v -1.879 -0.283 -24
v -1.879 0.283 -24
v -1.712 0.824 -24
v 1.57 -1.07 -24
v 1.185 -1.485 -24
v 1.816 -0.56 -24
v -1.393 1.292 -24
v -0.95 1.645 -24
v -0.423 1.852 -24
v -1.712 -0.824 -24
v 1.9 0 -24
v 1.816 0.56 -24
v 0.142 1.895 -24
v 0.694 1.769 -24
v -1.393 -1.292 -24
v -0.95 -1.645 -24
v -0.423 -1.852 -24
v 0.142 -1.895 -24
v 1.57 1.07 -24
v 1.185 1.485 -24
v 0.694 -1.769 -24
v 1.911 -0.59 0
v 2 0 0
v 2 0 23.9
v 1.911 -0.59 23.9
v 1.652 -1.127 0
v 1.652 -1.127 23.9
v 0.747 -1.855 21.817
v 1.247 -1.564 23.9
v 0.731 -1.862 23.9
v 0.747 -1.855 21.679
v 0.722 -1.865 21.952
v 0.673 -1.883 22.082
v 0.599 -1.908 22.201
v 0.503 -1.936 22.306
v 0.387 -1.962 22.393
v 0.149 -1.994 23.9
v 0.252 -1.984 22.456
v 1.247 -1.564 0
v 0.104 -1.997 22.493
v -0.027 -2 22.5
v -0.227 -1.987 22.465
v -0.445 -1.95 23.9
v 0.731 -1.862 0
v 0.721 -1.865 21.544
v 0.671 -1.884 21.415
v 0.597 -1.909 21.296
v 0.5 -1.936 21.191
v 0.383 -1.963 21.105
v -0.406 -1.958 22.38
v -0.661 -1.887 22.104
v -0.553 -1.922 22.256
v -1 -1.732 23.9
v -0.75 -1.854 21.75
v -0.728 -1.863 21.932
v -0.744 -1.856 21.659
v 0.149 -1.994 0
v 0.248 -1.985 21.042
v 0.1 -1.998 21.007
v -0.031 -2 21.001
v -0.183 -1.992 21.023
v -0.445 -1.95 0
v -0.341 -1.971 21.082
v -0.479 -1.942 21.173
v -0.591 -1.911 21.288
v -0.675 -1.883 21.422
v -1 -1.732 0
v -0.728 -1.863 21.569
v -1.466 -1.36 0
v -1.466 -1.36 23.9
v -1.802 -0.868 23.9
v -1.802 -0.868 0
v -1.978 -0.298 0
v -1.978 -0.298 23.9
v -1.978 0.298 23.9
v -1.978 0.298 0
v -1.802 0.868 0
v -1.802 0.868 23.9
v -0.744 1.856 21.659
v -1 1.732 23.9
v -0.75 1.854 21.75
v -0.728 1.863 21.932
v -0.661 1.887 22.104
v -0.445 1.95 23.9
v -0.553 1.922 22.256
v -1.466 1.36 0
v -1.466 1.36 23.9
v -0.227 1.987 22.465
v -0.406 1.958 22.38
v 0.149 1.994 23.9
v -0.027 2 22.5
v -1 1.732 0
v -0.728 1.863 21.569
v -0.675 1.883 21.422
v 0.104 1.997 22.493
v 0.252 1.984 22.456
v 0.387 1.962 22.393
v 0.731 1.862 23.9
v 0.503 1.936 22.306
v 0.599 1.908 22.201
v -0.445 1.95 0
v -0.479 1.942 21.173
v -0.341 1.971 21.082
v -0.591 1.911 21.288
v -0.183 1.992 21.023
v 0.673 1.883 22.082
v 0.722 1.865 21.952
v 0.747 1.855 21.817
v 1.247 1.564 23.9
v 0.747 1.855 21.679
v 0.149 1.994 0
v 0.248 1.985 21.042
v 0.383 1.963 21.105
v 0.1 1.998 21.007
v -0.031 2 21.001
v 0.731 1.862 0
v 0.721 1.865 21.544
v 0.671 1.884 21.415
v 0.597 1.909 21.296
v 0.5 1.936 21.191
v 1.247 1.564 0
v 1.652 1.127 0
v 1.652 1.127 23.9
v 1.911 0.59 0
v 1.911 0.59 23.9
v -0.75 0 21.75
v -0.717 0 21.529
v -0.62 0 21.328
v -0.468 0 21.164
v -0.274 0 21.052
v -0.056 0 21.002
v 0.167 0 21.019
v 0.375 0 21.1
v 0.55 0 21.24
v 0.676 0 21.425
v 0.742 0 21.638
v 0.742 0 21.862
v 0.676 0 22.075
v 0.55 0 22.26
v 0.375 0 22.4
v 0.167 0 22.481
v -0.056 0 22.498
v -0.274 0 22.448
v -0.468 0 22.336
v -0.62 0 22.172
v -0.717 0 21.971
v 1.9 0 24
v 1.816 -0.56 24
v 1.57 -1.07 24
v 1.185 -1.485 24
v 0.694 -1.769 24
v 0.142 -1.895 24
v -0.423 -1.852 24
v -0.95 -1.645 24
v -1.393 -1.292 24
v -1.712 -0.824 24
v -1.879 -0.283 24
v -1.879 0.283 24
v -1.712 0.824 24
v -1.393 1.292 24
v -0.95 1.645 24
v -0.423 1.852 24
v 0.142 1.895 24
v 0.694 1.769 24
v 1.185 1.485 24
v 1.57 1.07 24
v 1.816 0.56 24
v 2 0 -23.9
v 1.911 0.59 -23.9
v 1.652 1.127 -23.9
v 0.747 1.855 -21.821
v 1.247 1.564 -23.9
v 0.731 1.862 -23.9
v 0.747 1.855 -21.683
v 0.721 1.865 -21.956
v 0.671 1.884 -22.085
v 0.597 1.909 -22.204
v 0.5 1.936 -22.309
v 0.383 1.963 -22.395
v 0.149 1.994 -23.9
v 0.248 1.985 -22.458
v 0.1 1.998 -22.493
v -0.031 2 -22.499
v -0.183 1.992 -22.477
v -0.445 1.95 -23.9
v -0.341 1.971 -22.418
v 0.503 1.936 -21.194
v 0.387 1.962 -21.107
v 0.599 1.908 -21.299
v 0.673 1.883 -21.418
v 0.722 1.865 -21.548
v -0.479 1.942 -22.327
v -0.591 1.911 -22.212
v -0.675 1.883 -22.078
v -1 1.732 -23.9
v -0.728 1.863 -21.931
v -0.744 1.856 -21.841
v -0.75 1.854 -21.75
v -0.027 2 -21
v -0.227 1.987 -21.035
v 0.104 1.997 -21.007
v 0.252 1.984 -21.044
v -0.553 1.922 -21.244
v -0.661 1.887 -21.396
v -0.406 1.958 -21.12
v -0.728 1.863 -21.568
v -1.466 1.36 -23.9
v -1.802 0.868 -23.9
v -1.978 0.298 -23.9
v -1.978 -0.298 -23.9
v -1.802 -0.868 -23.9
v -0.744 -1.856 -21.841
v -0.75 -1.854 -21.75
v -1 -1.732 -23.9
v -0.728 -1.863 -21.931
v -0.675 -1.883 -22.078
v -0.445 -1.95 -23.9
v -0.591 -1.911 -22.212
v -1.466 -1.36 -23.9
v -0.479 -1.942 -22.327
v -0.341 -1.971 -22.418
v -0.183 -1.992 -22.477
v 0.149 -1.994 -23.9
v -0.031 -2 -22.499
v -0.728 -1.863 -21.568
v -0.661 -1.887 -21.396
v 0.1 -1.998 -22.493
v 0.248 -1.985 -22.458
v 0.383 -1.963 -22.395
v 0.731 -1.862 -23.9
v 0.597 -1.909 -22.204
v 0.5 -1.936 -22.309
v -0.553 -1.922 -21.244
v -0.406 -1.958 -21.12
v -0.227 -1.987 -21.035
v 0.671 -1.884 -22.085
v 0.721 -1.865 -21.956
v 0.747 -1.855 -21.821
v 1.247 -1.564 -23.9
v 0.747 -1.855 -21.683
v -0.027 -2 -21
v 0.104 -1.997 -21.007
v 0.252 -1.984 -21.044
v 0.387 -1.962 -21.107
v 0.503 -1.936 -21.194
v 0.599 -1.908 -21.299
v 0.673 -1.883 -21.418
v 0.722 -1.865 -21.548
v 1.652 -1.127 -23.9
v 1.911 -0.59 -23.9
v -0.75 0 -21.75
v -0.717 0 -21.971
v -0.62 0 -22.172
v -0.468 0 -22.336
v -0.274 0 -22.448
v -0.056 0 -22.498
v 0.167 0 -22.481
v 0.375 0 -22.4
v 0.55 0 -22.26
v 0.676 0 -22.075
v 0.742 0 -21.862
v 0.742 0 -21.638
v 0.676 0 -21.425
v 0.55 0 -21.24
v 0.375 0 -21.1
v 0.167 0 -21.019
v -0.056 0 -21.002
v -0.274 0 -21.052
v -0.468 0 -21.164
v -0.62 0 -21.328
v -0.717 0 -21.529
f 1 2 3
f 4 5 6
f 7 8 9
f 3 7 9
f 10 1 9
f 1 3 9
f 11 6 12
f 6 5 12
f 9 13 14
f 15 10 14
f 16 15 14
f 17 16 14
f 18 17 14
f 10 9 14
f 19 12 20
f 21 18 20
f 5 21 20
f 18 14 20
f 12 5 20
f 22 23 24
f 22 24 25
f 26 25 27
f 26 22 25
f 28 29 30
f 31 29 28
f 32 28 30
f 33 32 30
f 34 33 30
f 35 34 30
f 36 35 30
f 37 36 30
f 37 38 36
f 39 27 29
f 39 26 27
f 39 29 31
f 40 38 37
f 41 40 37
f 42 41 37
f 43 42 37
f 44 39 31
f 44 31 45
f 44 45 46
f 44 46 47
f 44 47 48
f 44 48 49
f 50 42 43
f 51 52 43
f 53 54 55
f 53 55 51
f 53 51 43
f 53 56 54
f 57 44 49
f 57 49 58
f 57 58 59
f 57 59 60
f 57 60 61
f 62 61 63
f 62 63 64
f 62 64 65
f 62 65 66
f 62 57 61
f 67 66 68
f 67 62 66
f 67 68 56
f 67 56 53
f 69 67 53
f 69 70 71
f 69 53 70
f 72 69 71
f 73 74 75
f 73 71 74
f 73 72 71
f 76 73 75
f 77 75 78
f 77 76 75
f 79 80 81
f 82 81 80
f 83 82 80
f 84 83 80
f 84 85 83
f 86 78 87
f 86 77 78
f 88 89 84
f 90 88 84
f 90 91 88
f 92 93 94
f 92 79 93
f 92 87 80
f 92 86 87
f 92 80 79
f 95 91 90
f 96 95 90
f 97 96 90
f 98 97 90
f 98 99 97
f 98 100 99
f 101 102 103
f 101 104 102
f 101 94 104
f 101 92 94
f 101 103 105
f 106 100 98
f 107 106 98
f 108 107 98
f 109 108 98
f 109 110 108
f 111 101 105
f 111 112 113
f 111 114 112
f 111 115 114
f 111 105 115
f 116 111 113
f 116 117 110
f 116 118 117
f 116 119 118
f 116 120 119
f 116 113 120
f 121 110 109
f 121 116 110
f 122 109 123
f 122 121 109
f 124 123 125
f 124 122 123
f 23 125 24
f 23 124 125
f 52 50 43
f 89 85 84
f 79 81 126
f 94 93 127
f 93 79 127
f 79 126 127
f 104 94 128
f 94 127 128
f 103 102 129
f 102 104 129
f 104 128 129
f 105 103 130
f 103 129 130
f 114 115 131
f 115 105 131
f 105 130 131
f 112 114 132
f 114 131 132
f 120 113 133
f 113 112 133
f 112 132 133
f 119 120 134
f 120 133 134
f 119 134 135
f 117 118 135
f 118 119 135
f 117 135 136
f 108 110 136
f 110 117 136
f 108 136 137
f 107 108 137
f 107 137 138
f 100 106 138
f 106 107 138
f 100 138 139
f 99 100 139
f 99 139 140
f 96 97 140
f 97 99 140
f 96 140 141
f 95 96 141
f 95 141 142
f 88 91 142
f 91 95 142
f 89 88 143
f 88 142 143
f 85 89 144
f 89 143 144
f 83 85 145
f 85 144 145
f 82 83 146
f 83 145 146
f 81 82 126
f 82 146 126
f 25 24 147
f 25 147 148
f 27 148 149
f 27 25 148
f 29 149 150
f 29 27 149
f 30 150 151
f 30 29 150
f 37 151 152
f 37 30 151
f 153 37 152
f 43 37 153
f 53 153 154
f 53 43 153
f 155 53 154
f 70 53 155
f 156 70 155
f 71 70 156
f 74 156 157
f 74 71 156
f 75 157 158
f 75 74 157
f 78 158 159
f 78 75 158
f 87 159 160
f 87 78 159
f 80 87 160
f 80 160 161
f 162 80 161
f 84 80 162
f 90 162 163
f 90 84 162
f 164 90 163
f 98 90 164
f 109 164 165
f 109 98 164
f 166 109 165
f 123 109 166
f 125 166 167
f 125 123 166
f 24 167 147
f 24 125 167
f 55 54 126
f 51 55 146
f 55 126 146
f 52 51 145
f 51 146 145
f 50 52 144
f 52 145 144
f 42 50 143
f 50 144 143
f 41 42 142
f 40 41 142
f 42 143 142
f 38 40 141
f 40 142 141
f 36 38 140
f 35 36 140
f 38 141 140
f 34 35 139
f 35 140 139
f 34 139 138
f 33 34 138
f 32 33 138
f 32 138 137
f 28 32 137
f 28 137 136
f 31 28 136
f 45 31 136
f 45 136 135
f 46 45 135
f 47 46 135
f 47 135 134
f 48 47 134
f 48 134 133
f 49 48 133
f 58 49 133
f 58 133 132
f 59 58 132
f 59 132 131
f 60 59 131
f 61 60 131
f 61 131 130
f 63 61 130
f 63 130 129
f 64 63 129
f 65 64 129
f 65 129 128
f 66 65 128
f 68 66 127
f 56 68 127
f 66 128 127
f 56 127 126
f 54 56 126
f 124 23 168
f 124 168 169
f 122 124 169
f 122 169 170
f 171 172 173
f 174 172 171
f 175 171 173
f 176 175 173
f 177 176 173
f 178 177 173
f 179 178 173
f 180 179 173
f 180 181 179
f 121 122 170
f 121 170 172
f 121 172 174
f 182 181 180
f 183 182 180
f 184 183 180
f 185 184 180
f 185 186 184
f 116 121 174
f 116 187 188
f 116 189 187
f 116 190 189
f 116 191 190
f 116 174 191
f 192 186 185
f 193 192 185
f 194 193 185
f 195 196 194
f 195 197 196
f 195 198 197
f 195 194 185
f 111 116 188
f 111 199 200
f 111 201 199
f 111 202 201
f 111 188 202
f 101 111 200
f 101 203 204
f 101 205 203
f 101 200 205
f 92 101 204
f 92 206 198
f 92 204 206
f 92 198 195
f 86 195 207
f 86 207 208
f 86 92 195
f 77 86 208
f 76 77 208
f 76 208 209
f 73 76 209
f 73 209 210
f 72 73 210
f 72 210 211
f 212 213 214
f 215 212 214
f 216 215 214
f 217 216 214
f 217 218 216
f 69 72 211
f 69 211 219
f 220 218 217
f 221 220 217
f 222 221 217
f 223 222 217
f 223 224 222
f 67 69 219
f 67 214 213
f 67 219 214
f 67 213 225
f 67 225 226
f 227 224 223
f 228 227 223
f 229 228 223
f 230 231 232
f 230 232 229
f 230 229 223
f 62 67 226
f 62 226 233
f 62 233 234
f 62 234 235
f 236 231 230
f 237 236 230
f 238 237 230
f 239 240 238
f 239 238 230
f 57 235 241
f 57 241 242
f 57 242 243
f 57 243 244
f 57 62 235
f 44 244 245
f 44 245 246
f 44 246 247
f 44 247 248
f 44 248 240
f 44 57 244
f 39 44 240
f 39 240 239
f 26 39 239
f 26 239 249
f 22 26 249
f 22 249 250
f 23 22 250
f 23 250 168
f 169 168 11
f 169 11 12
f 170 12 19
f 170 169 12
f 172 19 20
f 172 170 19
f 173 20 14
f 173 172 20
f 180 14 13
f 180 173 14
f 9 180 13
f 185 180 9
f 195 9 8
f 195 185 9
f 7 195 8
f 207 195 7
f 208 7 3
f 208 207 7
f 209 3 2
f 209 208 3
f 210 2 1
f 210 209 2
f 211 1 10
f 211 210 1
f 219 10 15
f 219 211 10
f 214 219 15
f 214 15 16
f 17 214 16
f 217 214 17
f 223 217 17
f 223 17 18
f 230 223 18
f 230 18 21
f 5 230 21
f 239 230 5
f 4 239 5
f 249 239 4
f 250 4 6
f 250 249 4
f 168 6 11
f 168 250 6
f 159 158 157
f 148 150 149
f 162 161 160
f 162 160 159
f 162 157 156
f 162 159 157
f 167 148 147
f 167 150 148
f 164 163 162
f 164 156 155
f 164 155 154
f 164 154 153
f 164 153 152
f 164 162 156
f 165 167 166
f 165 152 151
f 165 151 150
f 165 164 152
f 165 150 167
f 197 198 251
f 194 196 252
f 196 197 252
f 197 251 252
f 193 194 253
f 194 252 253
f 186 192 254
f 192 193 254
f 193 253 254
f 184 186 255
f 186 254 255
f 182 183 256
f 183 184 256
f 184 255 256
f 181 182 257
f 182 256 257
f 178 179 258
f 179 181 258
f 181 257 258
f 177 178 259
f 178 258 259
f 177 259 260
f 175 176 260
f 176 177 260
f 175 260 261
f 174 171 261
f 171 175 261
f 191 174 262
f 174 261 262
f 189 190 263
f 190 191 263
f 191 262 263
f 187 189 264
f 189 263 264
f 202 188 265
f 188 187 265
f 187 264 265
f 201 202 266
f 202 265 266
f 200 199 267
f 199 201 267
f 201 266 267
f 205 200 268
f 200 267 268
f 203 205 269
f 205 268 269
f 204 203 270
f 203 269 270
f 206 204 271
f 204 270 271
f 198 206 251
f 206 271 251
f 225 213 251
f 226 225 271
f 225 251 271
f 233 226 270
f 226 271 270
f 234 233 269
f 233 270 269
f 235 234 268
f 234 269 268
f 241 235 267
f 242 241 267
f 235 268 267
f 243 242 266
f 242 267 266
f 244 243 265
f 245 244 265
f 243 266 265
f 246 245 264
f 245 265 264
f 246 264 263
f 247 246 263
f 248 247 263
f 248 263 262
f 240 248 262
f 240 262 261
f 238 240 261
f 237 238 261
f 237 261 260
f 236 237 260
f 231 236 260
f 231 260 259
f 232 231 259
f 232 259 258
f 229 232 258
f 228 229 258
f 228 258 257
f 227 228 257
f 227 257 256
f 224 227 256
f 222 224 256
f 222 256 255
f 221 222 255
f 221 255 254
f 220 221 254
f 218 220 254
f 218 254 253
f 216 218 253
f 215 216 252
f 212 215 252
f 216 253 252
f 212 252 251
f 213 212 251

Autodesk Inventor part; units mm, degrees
ref_plane "YZ Plane" through (0, 0, 0) normal (1, 0, 0) x (0, 1, 0)
ref_plane "XZ Plane" through (0, 0, 0) normal (0, 1, 0) x (-1, 0, 0)
ref_plane "XY Plane" through (0, 0, 0) normal (0, 0, 1) x (1, 0, 0)
sketch "スケッチ1" plane through (0, 0, 0) normal (0, 0, 1) x (1, 0, 0)
  circle A0 centre (0, 0) radius 2
  dimension "d0" = 4
extrude "押し出し1" add sketch "スケッチ1" along normal mid plane 48
chamfer "面取り1" distance 0.1 angle 45 2 edges at (-2, 0, 24) (-2, 0, -24)
sketch "スケッチ2" plane through (0, 0, 0) normal (0, 1, 0) x (-1, 0, 0)
  line L0 (0, 0) -> (3.4806, 0) construction
  line L1 (0, 0) -> (0, -21.75) construction
  circle A0 centre (0, -21.75) radius 0.75
  circle A1 centre (0, 21.75) radius 0.75
  line L2 (2.6688, -21) -> (-4.3603, -21) construction
  dimension "d6" = 1.5
  dimension "d11" = 42
extrude "押し出し2" cut sketch "スケッチ2" along normal through all both and the other way through all
properties part number "COXA_ROLL_SHAFT_D4"
